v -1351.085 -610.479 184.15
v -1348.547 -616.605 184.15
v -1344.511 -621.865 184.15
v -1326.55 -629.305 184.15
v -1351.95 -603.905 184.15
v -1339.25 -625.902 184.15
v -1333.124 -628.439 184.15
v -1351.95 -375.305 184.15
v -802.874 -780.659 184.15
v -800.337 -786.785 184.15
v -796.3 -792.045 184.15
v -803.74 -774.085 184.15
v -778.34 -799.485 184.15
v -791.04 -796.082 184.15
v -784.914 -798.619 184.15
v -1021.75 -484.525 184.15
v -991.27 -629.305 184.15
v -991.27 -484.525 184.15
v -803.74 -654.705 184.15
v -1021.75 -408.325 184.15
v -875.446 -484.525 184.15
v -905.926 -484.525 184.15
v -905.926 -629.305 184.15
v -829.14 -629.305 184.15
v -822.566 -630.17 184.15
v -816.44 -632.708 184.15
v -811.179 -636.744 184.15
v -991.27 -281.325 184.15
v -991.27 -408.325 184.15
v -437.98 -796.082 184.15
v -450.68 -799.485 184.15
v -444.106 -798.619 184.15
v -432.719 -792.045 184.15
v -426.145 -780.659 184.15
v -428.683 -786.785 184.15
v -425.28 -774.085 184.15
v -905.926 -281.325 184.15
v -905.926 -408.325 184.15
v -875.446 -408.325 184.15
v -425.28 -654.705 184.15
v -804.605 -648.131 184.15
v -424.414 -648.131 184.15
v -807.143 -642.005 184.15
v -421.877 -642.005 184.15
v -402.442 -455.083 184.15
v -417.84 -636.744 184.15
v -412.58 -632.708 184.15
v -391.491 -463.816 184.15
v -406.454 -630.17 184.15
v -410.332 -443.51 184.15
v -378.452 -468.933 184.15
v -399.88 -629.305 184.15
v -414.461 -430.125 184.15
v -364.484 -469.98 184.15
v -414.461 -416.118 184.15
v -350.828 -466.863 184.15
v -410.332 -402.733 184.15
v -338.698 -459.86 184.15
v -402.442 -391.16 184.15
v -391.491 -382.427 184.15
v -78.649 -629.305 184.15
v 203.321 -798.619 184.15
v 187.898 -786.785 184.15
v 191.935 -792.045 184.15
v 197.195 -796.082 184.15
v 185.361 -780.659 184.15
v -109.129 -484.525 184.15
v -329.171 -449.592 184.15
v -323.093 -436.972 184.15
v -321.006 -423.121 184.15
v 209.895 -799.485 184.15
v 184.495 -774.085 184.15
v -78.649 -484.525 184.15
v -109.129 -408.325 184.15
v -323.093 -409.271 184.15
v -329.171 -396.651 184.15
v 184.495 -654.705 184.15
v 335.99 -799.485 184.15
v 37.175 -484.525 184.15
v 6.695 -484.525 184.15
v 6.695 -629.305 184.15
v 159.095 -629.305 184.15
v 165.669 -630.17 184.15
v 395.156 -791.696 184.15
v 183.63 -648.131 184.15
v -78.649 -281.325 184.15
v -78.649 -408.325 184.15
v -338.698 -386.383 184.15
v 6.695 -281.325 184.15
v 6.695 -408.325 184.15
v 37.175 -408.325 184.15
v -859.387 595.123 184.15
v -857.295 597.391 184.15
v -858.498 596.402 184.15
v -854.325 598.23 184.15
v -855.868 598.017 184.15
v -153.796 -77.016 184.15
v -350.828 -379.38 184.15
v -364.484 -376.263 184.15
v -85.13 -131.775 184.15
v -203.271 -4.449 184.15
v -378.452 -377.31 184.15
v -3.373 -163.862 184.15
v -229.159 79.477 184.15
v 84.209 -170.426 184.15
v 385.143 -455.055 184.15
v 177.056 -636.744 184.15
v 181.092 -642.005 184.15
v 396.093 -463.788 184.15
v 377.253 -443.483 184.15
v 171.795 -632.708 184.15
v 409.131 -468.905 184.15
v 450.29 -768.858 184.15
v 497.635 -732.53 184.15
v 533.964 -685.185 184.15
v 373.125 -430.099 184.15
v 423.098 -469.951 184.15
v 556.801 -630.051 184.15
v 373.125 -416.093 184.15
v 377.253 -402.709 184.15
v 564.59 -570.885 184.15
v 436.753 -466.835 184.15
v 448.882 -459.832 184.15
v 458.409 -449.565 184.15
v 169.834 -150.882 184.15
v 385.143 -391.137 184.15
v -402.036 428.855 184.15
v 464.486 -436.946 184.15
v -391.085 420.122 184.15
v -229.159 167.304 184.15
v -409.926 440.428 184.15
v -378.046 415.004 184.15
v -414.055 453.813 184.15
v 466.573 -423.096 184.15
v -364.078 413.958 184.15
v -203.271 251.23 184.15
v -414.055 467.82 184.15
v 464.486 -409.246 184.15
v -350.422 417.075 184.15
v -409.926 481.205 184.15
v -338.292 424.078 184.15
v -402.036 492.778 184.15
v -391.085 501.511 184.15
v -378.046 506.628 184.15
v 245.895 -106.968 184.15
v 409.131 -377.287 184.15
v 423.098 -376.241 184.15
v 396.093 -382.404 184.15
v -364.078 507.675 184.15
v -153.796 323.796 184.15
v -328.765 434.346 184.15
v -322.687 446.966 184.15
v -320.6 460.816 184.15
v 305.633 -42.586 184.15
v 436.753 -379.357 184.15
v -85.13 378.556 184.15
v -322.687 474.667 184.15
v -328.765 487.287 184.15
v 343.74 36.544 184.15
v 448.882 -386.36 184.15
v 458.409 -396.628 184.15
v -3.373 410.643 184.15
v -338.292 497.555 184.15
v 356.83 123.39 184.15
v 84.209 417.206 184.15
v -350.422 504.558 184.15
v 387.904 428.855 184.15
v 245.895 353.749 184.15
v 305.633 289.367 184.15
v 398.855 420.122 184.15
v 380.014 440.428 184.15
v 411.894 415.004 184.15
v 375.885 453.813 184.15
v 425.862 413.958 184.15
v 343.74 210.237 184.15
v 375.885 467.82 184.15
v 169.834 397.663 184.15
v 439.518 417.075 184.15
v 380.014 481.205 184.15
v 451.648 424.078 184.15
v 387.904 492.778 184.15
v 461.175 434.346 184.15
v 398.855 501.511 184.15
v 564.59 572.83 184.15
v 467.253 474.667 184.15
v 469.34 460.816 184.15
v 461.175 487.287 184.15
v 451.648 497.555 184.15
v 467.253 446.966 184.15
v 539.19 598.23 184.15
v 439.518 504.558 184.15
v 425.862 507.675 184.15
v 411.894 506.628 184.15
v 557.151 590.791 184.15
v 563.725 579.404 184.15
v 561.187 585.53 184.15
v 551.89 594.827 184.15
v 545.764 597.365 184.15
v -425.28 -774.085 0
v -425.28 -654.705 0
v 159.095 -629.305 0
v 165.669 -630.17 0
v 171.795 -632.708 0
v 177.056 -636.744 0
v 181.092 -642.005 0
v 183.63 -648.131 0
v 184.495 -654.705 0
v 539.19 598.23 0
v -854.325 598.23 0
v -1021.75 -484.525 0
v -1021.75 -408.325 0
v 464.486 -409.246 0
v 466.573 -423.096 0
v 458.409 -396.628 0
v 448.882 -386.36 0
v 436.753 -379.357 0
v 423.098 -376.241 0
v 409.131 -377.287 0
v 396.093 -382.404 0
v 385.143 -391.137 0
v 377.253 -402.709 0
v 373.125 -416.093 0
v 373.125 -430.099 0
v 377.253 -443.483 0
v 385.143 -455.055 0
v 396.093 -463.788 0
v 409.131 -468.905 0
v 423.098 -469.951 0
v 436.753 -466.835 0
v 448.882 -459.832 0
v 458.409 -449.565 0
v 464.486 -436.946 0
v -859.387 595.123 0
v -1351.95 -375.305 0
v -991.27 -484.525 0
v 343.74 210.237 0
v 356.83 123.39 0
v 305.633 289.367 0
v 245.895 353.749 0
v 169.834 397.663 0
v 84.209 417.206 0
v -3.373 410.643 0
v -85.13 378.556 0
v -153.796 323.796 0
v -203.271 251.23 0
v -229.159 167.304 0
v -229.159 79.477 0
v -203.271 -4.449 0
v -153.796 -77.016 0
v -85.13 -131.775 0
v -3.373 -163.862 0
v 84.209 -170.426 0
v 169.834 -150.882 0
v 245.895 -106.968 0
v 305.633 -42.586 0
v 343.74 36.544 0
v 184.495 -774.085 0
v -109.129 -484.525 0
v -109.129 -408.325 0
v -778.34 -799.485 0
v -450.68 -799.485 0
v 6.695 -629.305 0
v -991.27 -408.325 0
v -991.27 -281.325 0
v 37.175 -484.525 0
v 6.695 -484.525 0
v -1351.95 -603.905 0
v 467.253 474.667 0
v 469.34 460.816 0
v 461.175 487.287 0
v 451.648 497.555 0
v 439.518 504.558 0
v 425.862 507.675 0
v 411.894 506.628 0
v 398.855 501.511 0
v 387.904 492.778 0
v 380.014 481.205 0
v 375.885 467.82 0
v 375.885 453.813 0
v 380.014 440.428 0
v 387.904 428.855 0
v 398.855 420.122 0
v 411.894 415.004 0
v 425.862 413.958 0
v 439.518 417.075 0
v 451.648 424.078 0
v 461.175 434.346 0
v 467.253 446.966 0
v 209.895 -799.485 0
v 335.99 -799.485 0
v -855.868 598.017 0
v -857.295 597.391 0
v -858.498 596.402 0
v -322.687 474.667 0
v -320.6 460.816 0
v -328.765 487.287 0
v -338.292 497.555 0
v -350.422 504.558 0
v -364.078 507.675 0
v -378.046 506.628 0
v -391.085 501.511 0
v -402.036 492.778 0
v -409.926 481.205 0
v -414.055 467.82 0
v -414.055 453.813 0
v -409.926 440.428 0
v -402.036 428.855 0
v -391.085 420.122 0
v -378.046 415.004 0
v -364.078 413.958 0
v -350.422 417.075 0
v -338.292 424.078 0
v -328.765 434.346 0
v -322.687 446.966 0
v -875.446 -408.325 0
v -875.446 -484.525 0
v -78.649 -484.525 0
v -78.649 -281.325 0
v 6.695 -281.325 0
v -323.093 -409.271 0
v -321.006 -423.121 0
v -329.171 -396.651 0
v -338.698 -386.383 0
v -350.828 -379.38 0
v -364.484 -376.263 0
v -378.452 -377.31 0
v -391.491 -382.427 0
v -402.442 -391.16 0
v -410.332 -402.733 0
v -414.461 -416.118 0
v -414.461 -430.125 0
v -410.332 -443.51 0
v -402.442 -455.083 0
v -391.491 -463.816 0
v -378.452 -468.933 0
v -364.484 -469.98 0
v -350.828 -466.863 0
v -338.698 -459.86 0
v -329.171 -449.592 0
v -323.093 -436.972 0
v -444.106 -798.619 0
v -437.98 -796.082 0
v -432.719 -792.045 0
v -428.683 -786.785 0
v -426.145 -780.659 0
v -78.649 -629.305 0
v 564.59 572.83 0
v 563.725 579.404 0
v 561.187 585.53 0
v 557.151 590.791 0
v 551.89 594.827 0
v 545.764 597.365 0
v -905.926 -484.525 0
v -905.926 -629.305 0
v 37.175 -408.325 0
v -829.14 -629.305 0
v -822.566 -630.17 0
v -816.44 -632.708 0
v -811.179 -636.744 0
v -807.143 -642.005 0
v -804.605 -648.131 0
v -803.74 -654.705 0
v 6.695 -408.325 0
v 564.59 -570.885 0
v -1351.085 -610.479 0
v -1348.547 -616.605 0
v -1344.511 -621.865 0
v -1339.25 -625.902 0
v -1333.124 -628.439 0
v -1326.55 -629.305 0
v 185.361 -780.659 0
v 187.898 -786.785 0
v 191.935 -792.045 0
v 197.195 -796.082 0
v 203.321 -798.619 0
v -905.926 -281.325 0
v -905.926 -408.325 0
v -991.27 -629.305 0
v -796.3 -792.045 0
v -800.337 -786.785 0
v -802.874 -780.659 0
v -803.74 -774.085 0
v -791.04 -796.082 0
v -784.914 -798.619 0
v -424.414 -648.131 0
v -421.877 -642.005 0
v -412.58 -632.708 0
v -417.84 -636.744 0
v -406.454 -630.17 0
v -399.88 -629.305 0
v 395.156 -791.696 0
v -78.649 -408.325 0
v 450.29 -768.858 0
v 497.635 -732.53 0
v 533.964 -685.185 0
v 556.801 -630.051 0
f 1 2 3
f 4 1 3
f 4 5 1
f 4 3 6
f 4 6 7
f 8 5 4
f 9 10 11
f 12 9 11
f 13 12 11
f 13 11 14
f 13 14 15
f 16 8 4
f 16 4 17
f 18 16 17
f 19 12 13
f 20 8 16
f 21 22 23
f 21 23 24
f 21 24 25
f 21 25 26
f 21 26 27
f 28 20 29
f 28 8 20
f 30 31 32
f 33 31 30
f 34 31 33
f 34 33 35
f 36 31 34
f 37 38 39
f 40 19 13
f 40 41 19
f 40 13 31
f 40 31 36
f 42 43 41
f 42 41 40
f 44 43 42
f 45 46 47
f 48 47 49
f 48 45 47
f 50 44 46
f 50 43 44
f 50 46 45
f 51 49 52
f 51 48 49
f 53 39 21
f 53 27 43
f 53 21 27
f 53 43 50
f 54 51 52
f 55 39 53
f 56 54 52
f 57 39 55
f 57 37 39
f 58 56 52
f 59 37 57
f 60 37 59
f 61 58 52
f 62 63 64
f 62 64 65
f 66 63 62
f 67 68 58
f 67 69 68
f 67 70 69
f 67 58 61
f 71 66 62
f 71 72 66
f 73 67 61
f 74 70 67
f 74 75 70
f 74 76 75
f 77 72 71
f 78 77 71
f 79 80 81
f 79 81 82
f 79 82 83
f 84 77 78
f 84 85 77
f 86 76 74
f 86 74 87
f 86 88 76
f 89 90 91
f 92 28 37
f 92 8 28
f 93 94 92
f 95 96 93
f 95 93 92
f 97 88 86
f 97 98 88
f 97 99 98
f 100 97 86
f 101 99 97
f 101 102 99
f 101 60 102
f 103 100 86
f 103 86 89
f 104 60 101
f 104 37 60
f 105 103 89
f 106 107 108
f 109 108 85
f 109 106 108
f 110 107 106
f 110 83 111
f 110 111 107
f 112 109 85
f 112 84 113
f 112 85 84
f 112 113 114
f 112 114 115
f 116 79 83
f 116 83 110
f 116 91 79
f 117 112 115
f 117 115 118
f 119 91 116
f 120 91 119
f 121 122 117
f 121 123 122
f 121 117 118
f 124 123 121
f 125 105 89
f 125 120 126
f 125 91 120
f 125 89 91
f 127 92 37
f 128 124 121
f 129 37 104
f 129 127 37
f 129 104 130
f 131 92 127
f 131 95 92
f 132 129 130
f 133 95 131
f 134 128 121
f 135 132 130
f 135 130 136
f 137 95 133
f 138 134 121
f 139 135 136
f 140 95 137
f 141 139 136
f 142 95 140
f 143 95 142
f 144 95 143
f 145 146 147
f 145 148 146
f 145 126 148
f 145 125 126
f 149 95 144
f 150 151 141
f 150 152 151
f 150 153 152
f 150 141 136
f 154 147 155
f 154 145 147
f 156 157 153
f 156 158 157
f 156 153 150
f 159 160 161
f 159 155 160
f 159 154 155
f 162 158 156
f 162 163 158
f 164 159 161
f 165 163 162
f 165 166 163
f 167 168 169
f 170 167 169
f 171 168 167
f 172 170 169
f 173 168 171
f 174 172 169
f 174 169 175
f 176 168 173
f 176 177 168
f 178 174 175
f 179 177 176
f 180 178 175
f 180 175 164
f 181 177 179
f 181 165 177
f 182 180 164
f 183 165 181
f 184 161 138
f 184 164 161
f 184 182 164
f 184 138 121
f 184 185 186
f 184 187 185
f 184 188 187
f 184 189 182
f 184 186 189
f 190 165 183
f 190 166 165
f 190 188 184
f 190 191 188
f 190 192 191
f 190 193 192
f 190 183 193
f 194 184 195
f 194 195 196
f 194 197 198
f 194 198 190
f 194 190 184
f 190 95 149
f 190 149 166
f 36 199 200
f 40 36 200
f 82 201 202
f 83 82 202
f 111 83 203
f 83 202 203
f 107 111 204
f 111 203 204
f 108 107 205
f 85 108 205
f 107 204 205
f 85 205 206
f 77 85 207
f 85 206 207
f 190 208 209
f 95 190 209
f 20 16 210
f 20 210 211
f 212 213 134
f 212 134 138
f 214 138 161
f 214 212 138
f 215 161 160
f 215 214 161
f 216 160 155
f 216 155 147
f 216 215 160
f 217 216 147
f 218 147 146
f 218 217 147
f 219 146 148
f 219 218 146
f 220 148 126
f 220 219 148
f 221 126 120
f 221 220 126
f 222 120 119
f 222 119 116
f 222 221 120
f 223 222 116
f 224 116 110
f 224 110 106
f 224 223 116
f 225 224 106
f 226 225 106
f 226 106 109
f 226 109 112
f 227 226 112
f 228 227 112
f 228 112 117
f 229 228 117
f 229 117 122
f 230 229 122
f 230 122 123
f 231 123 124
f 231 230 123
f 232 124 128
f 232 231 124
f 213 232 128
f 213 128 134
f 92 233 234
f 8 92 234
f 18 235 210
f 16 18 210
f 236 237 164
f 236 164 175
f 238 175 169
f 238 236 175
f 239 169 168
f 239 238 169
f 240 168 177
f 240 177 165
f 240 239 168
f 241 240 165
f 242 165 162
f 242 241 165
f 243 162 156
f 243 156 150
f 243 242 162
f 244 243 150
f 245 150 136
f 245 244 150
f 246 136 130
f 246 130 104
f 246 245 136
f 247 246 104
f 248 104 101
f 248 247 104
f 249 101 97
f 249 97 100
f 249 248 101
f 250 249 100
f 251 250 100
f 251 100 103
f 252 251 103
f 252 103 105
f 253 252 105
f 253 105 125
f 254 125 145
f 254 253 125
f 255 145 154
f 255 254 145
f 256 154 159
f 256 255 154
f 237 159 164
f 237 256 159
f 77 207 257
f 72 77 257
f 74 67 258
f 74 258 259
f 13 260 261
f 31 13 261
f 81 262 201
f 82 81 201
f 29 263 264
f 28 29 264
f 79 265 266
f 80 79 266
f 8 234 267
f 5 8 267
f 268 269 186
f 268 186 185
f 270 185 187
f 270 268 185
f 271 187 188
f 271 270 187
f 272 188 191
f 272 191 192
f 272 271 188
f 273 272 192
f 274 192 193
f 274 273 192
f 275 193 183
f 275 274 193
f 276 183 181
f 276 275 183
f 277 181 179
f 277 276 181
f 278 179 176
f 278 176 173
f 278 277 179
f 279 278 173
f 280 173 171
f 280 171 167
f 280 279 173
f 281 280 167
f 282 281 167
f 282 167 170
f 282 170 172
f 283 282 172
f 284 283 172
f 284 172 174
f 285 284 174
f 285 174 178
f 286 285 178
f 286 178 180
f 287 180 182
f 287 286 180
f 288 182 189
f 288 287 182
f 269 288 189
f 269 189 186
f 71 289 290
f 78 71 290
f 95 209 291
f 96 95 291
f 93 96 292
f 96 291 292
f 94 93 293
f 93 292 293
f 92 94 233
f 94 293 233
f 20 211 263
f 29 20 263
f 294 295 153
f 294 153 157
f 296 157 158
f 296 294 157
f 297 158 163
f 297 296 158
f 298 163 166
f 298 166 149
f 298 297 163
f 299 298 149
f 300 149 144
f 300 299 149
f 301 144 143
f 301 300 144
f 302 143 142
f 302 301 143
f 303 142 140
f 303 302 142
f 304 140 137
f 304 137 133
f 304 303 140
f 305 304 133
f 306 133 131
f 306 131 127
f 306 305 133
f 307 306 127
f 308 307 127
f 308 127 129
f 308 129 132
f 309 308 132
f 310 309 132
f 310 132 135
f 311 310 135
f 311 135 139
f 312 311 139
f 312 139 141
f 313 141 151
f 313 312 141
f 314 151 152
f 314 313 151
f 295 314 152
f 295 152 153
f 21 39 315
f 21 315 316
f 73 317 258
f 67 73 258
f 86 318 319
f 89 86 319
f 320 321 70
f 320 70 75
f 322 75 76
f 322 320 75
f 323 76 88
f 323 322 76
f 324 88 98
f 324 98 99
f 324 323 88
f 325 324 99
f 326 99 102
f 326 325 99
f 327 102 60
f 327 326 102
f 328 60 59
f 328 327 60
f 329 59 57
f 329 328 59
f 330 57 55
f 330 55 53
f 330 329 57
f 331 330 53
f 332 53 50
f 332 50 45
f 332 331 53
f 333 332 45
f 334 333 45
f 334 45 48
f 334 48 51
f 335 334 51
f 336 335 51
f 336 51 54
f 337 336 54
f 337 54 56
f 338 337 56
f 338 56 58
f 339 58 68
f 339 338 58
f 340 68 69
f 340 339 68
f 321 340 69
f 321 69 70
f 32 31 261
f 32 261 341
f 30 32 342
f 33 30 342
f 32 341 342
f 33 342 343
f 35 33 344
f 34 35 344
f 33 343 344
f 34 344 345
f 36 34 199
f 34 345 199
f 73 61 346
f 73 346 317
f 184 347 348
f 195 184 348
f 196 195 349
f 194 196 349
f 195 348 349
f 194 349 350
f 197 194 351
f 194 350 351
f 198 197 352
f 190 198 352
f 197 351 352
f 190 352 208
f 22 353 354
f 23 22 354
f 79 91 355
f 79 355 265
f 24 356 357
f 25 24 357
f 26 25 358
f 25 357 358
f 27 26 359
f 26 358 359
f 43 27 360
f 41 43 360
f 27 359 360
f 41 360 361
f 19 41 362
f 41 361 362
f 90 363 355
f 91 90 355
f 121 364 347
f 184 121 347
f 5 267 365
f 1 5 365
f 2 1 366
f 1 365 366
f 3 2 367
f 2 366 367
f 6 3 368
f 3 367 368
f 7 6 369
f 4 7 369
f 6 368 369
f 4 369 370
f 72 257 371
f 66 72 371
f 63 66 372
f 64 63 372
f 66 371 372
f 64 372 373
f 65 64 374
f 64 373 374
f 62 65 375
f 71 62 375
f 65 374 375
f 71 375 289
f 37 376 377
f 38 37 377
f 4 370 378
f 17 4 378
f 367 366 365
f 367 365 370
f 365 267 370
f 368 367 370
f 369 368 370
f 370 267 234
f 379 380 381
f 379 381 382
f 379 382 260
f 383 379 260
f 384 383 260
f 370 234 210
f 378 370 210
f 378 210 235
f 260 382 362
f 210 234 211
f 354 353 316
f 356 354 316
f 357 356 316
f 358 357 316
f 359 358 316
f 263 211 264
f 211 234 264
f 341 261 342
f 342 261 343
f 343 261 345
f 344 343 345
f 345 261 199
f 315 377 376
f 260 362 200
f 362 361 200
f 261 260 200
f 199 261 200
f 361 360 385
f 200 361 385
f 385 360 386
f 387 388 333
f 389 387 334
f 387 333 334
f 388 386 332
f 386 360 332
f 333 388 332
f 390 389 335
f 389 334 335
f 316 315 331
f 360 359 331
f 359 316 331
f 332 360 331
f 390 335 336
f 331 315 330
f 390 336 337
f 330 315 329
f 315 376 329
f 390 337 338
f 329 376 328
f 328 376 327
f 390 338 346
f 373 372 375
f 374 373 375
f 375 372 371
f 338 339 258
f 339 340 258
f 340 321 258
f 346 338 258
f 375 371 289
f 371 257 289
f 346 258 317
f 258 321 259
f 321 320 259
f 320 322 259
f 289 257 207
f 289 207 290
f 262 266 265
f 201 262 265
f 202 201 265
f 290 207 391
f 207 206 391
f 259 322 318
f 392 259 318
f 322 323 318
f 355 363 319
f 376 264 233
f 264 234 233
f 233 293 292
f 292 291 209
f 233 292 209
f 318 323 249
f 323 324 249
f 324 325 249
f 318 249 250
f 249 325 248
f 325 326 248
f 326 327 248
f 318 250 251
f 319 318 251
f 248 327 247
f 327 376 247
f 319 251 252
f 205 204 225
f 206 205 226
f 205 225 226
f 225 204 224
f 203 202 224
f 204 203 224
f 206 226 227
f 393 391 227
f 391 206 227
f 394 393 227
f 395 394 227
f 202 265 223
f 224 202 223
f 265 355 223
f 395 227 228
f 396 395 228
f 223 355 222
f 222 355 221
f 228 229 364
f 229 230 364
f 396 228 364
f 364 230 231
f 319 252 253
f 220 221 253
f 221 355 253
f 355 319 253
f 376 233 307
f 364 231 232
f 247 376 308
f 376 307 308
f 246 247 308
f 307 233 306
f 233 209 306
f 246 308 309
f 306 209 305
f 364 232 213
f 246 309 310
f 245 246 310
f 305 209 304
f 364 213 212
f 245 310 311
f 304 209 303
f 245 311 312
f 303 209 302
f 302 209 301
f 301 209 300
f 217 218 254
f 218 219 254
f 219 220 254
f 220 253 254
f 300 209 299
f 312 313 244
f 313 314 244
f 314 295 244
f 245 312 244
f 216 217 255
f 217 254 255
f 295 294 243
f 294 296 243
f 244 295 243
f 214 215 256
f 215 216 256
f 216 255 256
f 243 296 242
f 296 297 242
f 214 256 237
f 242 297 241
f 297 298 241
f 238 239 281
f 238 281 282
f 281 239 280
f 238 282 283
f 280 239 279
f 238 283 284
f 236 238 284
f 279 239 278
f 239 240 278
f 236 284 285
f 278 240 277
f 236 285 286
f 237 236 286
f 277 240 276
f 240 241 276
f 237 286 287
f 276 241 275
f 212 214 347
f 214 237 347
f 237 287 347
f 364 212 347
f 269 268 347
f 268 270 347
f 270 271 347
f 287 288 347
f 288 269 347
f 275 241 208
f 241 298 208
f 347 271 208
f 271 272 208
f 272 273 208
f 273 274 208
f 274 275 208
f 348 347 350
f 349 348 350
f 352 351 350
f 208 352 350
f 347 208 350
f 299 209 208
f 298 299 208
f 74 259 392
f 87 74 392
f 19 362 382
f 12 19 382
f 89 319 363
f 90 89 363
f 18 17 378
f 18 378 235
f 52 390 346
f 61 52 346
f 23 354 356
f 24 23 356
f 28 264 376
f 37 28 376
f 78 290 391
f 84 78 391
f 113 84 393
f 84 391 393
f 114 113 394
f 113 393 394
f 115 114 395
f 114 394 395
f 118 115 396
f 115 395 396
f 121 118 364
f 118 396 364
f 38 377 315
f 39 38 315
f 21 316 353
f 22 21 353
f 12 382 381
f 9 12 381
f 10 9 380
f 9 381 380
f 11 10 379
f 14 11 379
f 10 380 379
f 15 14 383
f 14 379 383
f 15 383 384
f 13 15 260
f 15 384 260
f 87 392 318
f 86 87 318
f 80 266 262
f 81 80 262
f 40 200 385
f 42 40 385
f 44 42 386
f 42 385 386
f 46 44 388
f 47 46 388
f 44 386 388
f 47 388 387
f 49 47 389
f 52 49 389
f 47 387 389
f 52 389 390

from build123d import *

# Parameters (mm, degrees)
F0_R     = 46.99
F0_R_2   = 46.986706
F0_R_3   = 294.64
F1_DEPTH = 184.15


with BuildPart() as f1:
    # F0 (on Top) → F1 (new body)
    with BuildSketch(Plane.XY):
        with BuildLine():
            ThreePointArc((564.590297, 572.830329), (557.150809, 590.790842), (539.190297, 598.230329))
            Line((539.190297, 598.230329), (-854.324554, 598.230329))
            ThreePointArc((-854.324554, 598.230329), (-857.294719, 597.391413), (-859.38711, 595.122589))
            Line((-859.38711, 595.122589), (-1351.950452, -375.304965))
            Line((-1351.950452, -375.304965), (-1351.950452, -603.904965))
            ThreePointArc((-1351.950452, -603.904965), (-1344.510965, -621.865477), (-1326.550452, -629.304965))
            Line((-1326.550452, -629.304965), (-991.270452, -629.304965))
            Line((-991.270452, -629.304965), (-991.270452, -484.524965))
            Line((-991.270452, -484.524965), (-1021.750452, -484.524965))
            Line((-1021.750452, -484.524965), (-1021.750452, -408.324965))
            Line((-1021.750452, -408.324965), (-991.270452, -408.324965))
            Line((-991.270452, -408.324965), (-991.270452, -281.324965))
            Line((-991.270452, -281.324965), (-905.926452, -281.324965))
            Line((-905.926452, -281.324965), (-905.926452, -408.324965))
            Line((-905.926452, -408.324965), (-875.446452, -408.324965))
            Line((-875.446452, -408.324965), (-875.446452, -484.524965))
            Line((-875.446452, -484.524965), (-905.926452, -484.524965))
            Line((-905.926452, -484.524965), (-905.926452, -629.304965))
            Line((-905.926452, -629.304965), (-829.139571, -629.304965))
            ThreePointArc((-829.139571, -629.304965), (-811.179058, -636.744453), (-803.739571, -654.704965))
            Line((-803.739571, -654.704965), (-803.739571, -774.084965))
            ThreePointArc((-803.739571, -774.084965), (-796.300083, -792.045477), (-778.339571, -799.484965))
            Line((-778.339571, -799.484965), (-450.679571, -799.484965))
            ThreePointArc((-450.679571, -799.484965), (-432.719058, -792.045477), (-425.279571, -774.084965))
            Line((-425.279571, -774.084965), (-425.279571, -654.704965))
            ThreePointArc((-425.279571, -654.704965), (-417.840083, -636.744453), (-399.879571, -629.304965))
            Line((-399.879571, -629.304965), (-78.648547, -629.304965))
            Line((-78.648547, -629.304965), (-78.648547, -484.524965))
            Line((-78.648547, -484.524965), (-109.128547, -484.524965))
            Line((-109.128547, -484.524965), (-109.128547, -408.324965))
            Line((-109.128547, -408.324965), (-78.648547, -408.324965))
            Line((-78.648547, -408.324965), (-78.648547, -281.324965))
            Line((-78.648547, -281.324965), (6.695453, -281.324965))
            Line((6.695453, -281.324965), (6.695453, -408.324965))
            Line((6.695453, -408.324965), (37.175453, -408.324965))
            Line((37.175453, -408.324965), (37.175453, -484.524965))
            Line((37.175453, -484.524965), (6.695453, -484.524965))
            Line((6.695453, -484.524965), (6.695453, -629.304965))
            Line((6.695453, -629.304965), (159.095453, -629.304965))
            ThreePointArc((159.095453, -629.304965), (177.055965, -636.744453), (184.495453, -654.704965))
            Line((184.495453, -654.704965), (184.495453, -774.084965))
            ThreePointArc((184.495453, -774.084965), (191.934941, -792.045477), (209.895453, -799.484965))
            Line((209.895453, -799.484965), (335.990297, -799.484965))
            ThreePointArc((335.990297, -799.484965), (497.634907, -732.529575), (564.590297, -570.884965))
            Line((564.590297, -570.884965), (564.590297, 572.830329))
        make_face()
        with Locations((-367.995667, -423.121417)):
            Circle(F0_R, mode=Mode.SUBTRACT)
        with Locations((419.586441, -423.096056)):
            Circle(F0_R_2, mode=Mode.SUBTRACT)
        with Locations((62.190297, 123.390329)):
            Circle(F0_R_3, mode=Mode.SUBTRACT)
        with Locations((-367.589703, 460.816329)):
            Circle(F0_R, mode=Mode.SUBTRACT)
        with Locations((422.350297, 460.816329)):
            Circle(F0_R, mode=Mode.SUBTRACT)
    extrude(amount=F1_DEPTH)


solid = f1.part
